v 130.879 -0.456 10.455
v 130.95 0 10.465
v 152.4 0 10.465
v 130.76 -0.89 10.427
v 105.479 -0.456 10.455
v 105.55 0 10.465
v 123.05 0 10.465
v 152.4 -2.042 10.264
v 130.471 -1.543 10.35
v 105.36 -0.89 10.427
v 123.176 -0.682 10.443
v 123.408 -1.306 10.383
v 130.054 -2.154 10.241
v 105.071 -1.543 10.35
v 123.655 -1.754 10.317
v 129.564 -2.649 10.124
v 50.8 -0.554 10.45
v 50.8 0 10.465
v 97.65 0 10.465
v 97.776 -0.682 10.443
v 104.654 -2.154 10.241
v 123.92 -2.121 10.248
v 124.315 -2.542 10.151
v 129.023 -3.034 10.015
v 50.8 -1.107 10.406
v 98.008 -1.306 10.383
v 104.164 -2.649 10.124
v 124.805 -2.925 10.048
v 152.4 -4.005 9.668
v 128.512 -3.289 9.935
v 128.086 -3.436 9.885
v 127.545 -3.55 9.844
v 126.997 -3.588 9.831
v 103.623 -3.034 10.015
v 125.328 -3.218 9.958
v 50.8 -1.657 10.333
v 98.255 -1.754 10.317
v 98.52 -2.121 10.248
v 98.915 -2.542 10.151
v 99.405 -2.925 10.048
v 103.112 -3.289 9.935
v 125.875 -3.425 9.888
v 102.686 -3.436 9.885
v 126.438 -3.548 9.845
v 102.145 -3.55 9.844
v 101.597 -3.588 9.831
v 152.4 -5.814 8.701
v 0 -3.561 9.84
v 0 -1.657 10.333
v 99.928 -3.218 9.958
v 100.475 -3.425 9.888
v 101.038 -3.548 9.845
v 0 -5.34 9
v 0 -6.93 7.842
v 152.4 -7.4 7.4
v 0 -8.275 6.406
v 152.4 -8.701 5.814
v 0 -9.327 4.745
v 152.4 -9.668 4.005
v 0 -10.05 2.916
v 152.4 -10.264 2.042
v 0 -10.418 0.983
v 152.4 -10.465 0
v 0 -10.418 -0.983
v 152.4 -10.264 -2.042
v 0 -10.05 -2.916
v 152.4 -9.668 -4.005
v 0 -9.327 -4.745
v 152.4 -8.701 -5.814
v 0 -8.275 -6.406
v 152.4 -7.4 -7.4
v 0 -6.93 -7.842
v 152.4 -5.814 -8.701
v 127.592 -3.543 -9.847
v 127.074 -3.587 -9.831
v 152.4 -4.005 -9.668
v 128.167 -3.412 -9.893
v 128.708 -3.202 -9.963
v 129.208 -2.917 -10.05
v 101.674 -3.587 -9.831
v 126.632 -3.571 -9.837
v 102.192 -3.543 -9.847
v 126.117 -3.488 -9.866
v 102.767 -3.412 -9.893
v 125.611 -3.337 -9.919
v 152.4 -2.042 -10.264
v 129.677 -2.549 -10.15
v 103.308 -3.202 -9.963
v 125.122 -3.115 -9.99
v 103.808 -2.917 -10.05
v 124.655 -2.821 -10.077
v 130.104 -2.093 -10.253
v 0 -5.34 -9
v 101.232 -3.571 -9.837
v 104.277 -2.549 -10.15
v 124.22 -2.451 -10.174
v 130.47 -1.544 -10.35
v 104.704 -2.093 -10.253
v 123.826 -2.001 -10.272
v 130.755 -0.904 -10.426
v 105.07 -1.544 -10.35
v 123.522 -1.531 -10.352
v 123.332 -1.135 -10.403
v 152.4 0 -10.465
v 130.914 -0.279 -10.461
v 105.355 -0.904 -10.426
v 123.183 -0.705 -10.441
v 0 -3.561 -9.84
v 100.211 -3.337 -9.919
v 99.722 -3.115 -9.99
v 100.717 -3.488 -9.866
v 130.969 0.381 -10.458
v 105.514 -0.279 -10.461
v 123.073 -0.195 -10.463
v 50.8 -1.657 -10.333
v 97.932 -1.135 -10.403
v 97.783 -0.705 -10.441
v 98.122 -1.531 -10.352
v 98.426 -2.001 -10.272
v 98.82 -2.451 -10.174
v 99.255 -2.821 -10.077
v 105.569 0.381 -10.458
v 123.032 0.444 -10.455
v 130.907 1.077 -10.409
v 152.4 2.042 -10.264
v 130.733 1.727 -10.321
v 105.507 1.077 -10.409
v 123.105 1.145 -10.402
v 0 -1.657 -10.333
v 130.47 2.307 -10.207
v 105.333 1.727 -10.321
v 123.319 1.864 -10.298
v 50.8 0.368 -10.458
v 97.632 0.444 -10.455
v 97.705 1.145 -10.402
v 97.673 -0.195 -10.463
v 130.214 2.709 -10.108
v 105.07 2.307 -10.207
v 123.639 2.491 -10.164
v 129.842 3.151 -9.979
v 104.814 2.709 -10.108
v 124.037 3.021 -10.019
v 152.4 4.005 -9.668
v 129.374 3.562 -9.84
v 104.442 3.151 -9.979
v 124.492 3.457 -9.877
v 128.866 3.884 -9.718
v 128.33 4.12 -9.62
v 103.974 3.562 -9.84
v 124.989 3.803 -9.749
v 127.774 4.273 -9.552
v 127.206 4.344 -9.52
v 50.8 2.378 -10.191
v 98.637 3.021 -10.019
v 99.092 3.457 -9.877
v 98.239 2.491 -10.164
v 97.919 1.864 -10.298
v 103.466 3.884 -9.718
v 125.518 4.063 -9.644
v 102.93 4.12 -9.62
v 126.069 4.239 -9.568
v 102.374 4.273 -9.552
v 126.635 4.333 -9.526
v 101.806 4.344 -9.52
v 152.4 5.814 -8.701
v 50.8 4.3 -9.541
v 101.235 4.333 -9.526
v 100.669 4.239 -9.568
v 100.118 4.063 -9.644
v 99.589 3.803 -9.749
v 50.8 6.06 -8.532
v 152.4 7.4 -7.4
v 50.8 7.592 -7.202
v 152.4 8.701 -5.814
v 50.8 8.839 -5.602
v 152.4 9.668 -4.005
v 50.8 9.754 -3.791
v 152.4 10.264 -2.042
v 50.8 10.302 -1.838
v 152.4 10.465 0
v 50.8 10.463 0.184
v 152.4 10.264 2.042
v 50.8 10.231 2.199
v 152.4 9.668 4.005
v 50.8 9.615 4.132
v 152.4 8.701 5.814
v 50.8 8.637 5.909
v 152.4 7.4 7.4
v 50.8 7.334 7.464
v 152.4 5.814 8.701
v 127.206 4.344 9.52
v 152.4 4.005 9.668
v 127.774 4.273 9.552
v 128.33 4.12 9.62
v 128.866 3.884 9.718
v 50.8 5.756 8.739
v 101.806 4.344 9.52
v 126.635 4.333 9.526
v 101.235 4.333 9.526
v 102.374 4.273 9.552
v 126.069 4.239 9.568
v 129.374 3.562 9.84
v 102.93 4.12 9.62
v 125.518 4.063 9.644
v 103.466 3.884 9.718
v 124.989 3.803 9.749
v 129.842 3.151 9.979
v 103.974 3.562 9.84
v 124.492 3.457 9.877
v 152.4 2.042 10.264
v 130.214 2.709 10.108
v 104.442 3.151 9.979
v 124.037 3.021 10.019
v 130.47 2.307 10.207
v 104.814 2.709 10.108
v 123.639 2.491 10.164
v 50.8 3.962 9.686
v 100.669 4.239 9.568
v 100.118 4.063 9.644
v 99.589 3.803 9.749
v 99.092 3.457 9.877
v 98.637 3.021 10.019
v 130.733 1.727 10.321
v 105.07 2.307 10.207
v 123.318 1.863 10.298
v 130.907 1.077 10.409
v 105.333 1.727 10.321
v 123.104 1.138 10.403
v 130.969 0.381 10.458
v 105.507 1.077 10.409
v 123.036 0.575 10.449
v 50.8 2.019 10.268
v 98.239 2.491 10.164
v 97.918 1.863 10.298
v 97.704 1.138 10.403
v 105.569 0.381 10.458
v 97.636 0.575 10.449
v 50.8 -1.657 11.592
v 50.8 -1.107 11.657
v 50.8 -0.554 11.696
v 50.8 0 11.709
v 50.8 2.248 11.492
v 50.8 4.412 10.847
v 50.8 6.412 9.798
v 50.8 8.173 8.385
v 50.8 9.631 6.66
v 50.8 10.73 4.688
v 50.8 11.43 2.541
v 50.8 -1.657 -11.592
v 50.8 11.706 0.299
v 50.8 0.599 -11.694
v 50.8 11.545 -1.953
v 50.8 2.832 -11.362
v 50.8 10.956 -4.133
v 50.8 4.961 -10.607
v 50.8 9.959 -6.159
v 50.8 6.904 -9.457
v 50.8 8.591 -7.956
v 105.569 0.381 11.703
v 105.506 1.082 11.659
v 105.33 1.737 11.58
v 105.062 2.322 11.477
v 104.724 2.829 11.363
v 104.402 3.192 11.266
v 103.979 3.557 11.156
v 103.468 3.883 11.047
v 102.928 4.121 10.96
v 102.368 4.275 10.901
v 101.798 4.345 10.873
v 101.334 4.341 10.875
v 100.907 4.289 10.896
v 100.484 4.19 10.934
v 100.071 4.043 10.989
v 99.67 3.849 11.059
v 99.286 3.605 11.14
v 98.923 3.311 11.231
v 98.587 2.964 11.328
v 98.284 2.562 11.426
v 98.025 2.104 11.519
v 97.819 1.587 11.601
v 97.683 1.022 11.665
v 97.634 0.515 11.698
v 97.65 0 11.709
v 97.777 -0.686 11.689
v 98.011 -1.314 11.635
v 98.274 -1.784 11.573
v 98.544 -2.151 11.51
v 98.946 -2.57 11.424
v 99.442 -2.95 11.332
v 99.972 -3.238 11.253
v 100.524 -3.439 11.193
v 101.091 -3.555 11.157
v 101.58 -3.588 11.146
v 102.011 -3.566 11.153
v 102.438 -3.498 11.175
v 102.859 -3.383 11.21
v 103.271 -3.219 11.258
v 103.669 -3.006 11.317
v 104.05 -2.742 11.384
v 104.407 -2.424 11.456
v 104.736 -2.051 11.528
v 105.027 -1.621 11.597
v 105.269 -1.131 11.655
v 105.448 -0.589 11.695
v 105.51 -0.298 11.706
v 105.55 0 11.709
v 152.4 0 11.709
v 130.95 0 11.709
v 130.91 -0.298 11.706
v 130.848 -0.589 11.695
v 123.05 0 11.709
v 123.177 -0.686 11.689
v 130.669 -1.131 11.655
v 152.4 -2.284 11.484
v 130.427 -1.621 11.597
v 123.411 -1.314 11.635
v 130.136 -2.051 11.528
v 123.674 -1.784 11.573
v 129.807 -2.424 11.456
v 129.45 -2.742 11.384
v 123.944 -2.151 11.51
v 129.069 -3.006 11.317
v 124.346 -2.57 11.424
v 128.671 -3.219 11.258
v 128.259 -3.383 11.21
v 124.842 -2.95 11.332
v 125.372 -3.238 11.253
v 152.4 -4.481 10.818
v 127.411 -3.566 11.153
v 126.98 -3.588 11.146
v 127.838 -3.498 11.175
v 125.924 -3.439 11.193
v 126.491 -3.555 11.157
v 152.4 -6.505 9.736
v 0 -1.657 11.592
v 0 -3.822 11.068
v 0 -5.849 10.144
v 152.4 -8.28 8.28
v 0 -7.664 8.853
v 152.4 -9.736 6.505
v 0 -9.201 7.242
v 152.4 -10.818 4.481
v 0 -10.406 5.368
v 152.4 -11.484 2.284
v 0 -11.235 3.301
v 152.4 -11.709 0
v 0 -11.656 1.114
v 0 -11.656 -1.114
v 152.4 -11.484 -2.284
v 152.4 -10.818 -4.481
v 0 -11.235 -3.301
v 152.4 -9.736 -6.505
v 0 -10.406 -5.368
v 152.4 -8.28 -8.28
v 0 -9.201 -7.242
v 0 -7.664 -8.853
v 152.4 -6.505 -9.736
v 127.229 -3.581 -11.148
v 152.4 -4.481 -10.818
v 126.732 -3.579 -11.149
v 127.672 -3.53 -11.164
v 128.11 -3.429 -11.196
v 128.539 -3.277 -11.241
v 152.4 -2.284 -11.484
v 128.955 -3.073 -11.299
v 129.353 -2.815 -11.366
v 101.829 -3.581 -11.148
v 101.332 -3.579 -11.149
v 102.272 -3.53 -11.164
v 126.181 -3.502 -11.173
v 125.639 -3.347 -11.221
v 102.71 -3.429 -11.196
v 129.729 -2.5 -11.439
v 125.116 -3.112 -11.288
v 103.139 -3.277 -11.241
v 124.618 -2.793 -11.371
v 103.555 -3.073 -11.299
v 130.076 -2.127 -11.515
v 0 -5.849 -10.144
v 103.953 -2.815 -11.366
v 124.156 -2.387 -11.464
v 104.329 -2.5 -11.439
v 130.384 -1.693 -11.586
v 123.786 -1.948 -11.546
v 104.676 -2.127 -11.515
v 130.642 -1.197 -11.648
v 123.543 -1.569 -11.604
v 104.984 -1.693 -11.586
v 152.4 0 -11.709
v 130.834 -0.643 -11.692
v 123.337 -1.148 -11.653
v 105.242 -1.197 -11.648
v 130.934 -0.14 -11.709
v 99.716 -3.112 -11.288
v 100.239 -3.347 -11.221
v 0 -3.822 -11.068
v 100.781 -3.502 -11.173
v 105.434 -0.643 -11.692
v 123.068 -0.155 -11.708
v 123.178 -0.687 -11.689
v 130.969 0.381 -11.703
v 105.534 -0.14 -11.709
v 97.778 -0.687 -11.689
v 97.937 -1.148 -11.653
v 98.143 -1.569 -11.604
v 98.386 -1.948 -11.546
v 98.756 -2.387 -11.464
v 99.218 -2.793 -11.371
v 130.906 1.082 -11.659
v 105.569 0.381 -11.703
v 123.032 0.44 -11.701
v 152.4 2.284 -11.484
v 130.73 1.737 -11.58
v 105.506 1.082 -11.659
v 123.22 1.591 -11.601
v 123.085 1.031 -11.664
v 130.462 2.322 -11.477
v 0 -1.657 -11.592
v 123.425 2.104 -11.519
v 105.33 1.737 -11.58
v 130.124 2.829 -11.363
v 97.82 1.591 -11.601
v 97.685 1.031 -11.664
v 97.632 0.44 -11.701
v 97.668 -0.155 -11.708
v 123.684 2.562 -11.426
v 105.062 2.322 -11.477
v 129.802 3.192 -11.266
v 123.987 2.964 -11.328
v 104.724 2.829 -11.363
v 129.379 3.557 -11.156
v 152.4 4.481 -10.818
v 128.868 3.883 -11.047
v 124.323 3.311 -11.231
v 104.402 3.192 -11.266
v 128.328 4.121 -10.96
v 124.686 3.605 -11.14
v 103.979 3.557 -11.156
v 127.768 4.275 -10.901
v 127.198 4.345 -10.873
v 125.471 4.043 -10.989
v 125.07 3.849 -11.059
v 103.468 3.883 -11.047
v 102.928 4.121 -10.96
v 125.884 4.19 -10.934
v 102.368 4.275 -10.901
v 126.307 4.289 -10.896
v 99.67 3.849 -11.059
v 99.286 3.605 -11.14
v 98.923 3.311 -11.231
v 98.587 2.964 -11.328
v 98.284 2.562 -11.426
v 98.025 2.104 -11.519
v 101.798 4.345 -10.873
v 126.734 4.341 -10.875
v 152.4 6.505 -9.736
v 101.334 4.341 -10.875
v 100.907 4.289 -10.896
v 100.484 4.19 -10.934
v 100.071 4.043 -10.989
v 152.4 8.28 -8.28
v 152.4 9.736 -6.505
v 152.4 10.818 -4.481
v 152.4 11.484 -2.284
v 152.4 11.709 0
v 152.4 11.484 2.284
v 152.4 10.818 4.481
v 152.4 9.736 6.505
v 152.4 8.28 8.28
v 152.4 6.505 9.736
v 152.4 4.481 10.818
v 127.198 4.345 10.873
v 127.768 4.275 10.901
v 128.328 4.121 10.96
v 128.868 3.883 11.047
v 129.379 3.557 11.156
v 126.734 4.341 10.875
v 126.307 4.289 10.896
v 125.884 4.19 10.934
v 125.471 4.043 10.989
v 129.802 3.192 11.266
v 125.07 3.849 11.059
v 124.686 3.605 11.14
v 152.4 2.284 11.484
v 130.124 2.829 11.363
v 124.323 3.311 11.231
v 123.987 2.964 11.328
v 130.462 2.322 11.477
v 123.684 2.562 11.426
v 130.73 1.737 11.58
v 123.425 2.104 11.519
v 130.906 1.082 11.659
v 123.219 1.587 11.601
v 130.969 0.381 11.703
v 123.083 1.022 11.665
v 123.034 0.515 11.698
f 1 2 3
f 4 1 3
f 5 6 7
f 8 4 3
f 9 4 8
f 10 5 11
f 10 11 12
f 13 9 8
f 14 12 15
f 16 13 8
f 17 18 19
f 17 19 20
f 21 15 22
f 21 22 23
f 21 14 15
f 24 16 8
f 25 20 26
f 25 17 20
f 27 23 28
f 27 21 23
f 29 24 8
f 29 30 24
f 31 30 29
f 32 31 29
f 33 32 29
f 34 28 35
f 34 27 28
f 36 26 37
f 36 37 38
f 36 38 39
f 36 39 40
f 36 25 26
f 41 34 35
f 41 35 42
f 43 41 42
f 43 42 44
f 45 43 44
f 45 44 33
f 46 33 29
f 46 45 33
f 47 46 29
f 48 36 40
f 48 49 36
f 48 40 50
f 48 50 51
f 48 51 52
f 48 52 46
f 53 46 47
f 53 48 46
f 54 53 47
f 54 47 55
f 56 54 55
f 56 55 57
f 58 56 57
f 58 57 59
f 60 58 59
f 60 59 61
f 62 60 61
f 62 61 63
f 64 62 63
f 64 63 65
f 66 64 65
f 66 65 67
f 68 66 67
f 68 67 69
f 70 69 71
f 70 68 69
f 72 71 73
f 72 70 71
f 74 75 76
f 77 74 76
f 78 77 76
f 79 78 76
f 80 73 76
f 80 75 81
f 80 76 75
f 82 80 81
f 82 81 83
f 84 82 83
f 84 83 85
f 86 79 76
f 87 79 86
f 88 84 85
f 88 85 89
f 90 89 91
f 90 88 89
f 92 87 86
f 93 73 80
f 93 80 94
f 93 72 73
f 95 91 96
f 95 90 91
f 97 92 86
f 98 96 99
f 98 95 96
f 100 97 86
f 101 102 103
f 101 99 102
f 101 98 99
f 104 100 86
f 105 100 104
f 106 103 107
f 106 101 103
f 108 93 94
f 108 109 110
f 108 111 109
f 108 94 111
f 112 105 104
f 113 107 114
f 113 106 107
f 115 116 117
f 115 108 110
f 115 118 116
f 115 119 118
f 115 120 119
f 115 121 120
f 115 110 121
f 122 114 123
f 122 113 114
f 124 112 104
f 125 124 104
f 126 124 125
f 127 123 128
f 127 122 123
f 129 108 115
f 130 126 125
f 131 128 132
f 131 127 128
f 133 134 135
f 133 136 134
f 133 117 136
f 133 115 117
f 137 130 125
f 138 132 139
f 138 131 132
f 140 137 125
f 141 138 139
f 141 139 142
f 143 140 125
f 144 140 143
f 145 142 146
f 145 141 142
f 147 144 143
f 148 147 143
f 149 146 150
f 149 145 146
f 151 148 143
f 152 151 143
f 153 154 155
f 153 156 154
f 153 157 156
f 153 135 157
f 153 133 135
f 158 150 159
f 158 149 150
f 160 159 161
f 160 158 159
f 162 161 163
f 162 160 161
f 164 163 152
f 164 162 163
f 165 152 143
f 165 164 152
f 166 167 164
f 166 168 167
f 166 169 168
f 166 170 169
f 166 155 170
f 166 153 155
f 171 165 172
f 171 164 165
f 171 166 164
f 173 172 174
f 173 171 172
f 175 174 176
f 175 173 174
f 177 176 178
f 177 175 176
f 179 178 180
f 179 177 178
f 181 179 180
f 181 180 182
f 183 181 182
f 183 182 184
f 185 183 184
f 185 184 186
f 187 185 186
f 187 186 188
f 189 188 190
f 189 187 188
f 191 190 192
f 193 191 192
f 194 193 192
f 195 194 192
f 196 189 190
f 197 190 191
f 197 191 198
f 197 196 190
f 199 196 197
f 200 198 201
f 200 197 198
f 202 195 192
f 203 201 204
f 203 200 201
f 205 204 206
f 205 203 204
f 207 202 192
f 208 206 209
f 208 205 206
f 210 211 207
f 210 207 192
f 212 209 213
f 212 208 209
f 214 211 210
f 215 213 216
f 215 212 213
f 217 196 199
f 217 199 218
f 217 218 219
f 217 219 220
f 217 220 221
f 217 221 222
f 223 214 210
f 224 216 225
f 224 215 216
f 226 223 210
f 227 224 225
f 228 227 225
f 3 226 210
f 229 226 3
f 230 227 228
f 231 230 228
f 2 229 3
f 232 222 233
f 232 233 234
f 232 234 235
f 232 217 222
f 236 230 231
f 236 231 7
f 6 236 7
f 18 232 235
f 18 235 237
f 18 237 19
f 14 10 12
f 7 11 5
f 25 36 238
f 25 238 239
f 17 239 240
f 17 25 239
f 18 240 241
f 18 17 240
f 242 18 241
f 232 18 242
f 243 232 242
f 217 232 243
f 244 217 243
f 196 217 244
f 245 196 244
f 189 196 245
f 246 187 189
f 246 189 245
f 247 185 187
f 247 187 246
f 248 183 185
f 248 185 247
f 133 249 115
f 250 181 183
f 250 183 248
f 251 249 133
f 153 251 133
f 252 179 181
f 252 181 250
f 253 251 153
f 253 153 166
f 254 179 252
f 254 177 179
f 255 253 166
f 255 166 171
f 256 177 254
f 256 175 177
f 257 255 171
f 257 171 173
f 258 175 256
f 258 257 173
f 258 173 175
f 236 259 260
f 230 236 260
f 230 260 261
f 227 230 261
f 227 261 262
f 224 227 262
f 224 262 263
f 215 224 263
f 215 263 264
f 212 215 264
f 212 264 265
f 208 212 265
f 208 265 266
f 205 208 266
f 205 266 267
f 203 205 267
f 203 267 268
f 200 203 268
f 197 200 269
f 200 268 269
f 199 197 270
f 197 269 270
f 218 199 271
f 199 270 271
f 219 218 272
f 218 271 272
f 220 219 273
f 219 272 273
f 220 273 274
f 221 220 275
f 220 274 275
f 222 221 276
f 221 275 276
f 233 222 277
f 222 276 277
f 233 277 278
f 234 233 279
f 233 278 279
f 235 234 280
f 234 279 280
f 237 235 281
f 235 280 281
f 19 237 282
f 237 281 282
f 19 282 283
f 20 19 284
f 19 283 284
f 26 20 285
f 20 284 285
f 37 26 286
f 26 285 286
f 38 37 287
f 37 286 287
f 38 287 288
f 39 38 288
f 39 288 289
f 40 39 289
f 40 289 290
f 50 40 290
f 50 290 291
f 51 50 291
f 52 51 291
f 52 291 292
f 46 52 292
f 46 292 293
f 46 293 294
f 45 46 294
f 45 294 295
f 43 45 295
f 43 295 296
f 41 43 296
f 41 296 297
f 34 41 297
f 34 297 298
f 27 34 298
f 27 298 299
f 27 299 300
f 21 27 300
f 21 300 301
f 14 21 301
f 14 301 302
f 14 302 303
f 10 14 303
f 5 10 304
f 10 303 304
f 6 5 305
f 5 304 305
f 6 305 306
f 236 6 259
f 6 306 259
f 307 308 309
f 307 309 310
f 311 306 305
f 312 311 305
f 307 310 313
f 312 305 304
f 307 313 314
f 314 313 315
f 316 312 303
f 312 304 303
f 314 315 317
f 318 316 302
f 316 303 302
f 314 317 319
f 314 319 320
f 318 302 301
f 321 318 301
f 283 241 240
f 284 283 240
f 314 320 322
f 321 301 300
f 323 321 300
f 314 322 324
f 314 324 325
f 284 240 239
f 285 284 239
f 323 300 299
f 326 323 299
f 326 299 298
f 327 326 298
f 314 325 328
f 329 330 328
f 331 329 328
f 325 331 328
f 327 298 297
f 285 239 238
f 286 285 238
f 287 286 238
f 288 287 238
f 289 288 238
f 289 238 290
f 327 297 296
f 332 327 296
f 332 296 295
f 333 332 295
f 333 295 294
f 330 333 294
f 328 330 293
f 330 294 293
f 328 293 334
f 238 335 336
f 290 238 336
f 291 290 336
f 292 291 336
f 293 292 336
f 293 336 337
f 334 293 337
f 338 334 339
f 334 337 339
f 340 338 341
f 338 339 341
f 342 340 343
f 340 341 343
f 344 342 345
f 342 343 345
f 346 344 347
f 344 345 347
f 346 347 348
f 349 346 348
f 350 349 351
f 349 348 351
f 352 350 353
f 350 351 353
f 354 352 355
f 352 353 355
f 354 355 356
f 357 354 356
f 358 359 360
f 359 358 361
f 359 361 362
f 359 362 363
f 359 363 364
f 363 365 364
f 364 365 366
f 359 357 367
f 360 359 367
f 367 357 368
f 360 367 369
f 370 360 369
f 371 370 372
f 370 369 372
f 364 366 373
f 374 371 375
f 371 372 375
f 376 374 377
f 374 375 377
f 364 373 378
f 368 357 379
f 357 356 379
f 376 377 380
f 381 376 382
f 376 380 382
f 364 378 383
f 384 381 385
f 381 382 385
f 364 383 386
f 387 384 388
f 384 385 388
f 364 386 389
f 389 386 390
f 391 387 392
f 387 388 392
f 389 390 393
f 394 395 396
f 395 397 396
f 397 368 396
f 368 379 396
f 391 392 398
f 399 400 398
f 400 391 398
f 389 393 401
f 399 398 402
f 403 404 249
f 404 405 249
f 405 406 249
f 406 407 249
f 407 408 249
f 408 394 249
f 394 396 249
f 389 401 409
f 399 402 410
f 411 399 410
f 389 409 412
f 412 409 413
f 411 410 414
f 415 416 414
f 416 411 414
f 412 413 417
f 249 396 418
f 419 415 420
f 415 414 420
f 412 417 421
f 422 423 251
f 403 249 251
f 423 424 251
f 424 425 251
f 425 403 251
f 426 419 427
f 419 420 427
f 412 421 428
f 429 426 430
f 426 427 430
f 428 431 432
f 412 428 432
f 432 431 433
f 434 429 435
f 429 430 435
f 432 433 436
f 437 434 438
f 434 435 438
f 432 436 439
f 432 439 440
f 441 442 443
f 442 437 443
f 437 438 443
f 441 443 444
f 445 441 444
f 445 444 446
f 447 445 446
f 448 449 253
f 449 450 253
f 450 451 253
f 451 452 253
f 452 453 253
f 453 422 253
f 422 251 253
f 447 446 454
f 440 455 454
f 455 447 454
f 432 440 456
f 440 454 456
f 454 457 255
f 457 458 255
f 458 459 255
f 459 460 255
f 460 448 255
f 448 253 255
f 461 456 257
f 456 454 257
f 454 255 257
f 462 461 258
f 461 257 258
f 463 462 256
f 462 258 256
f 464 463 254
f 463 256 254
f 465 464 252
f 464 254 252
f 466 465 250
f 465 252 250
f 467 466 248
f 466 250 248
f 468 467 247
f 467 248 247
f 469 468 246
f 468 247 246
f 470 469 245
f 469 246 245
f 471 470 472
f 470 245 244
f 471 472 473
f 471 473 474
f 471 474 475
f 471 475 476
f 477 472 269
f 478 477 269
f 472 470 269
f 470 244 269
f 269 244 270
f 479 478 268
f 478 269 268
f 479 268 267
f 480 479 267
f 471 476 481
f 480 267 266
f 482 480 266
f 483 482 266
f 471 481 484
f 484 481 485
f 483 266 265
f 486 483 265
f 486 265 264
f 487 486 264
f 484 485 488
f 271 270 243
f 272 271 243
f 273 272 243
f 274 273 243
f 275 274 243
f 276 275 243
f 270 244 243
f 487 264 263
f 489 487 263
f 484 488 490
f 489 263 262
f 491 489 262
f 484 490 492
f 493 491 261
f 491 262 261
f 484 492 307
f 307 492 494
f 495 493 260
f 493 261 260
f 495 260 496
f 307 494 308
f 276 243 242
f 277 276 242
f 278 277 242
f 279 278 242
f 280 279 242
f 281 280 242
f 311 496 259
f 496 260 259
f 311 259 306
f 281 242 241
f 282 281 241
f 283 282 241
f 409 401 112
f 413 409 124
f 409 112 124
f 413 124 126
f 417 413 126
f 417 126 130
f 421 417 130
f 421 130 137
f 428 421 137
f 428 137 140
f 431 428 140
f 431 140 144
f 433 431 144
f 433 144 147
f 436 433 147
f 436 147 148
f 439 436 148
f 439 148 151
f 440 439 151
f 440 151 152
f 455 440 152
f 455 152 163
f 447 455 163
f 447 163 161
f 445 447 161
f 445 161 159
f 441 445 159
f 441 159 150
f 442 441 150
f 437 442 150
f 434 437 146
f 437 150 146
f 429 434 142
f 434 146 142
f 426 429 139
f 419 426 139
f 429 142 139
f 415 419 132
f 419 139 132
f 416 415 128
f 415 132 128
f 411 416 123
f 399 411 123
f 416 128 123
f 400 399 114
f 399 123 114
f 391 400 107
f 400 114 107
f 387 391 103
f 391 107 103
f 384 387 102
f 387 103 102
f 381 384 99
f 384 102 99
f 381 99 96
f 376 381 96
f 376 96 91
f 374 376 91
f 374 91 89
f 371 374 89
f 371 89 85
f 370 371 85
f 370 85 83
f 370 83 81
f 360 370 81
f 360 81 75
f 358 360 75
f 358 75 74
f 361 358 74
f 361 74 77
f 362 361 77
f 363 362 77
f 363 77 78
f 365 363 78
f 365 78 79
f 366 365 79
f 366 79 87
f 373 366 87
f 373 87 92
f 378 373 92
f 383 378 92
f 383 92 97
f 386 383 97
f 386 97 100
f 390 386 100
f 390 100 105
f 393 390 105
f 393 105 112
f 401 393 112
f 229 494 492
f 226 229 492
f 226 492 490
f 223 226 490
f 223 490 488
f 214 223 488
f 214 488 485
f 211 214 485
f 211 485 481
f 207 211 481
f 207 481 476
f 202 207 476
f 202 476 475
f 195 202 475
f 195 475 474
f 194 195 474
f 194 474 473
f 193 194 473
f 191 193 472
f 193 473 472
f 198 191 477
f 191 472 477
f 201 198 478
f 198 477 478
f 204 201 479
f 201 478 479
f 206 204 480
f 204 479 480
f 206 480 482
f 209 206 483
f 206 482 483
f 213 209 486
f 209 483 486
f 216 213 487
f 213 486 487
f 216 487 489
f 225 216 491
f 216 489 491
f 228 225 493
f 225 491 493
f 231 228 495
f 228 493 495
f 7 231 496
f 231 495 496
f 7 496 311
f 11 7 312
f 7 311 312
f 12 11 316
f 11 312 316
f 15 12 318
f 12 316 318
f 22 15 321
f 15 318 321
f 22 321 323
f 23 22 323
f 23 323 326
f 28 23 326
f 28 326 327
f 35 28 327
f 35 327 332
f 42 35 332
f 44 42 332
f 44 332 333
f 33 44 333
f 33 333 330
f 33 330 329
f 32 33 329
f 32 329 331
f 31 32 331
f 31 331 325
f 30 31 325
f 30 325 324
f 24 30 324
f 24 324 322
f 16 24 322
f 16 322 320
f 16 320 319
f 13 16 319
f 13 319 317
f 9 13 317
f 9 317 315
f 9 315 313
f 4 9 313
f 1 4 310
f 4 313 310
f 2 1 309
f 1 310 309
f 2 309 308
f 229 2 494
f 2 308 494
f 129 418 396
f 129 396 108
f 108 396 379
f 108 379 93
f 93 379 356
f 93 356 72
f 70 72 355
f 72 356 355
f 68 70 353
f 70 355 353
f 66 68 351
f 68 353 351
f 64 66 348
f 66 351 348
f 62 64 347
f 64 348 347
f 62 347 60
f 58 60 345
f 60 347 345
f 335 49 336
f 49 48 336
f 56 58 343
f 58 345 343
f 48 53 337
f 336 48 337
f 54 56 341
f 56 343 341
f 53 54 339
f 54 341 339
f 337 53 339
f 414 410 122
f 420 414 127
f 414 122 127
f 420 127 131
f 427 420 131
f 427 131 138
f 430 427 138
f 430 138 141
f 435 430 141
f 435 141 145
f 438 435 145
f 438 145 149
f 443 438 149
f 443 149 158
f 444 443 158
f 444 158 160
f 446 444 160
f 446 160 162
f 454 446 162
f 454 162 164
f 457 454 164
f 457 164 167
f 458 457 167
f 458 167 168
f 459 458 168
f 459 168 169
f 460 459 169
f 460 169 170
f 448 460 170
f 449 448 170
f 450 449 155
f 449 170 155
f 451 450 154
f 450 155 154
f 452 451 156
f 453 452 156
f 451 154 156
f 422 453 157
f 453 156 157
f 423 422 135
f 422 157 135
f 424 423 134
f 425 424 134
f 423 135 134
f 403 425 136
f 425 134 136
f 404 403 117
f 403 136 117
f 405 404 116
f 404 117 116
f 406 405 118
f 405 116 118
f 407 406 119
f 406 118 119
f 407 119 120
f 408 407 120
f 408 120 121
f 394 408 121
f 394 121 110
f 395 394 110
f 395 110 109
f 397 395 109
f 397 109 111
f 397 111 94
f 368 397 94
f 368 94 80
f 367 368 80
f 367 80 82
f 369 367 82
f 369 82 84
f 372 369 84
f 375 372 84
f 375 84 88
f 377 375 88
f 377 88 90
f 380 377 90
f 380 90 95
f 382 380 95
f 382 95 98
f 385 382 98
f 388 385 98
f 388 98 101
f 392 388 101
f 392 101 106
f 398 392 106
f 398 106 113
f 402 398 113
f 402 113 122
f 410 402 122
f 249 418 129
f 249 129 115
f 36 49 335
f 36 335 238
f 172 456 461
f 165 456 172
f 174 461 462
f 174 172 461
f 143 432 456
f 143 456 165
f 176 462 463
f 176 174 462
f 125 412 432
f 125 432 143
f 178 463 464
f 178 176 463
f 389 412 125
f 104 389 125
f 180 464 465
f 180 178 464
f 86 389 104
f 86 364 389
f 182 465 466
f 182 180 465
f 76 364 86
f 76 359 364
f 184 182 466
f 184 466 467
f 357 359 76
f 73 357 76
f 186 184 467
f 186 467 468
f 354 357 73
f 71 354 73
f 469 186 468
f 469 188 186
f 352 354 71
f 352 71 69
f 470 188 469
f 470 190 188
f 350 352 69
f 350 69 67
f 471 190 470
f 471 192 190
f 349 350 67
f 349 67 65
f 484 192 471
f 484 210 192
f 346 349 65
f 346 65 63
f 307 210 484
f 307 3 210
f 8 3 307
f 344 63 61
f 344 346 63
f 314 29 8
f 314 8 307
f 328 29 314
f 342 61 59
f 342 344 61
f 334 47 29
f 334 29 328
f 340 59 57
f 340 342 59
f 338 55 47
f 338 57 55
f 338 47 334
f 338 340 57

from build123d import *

# Parameters (mm, degrees)
SKETCH3_R               = 11.7094
SKETCH3_R_2             = 10.4648
BOSS_EXTRUDE1_DEPTH     = 152.4
CUT_EXTRUDE1_DEPTH      = 154.29703225
CUT_EXTRUDE1_DEPTH_BACK = 154.29703225
SKETCH4_W               = 50.8
SKETCH4_H               = 19.05
SKETCH8_R               = 3.96875
CUT_EXTRUDE2_DEPTH      = 155.632823947


with BuildPart() as part:
    # Sketch3 → Boss-Extrude1 (new body)
    with BuildSketch(Plane(origin=(0, 0, 0), x_dir=(0, 0, -1), z_dir=(1, 0, 0))):
        with Locations(Location((0, 0, 0), (0, 0, 180))):
            Circle(SKETCH3_R)
        with Locations(Location((0, 0, 0), (0, 0, 180))):
            Circle(SKETCH3_R_2, mode=Mode.SUBTRACT)
    extrude(amount=BOSS_EXTRUDE1_DEPTH)

    # Sketch4 → Cut-Extrude1 (cut, two sides: drawn at the far end of the back side and taken through both)
    with BuildSketch(Plane.XY.offset(-CUT_EXTRUDE1_DEPTH_BACK)):
        with Locations((25.4, 7.867878263)):
            Rectangle(SKETCH4_W, SKETCH4_H)
    extrude(amount=CUT_EXTRUDE1_DEPTH + CUT_EXTRUDE1_DEPTH_BACK, mode=Mode.SUBTRACT)

    # Sketch8 → Cut-Extrude2 (cut, through all)
    with BuildSketch(Plane.XY.offset(11.7094)):
        with Locations((101.6, 0.381)):
            Circle(SKETCH8_R)
        with Locations((127, 0.381)):
            Circle(SKETCH8_R)
    extrude(amount=-CUT_EXTRUDE2_DEPTH, mode=Mode.SUBTRACT)


solid = part.part
